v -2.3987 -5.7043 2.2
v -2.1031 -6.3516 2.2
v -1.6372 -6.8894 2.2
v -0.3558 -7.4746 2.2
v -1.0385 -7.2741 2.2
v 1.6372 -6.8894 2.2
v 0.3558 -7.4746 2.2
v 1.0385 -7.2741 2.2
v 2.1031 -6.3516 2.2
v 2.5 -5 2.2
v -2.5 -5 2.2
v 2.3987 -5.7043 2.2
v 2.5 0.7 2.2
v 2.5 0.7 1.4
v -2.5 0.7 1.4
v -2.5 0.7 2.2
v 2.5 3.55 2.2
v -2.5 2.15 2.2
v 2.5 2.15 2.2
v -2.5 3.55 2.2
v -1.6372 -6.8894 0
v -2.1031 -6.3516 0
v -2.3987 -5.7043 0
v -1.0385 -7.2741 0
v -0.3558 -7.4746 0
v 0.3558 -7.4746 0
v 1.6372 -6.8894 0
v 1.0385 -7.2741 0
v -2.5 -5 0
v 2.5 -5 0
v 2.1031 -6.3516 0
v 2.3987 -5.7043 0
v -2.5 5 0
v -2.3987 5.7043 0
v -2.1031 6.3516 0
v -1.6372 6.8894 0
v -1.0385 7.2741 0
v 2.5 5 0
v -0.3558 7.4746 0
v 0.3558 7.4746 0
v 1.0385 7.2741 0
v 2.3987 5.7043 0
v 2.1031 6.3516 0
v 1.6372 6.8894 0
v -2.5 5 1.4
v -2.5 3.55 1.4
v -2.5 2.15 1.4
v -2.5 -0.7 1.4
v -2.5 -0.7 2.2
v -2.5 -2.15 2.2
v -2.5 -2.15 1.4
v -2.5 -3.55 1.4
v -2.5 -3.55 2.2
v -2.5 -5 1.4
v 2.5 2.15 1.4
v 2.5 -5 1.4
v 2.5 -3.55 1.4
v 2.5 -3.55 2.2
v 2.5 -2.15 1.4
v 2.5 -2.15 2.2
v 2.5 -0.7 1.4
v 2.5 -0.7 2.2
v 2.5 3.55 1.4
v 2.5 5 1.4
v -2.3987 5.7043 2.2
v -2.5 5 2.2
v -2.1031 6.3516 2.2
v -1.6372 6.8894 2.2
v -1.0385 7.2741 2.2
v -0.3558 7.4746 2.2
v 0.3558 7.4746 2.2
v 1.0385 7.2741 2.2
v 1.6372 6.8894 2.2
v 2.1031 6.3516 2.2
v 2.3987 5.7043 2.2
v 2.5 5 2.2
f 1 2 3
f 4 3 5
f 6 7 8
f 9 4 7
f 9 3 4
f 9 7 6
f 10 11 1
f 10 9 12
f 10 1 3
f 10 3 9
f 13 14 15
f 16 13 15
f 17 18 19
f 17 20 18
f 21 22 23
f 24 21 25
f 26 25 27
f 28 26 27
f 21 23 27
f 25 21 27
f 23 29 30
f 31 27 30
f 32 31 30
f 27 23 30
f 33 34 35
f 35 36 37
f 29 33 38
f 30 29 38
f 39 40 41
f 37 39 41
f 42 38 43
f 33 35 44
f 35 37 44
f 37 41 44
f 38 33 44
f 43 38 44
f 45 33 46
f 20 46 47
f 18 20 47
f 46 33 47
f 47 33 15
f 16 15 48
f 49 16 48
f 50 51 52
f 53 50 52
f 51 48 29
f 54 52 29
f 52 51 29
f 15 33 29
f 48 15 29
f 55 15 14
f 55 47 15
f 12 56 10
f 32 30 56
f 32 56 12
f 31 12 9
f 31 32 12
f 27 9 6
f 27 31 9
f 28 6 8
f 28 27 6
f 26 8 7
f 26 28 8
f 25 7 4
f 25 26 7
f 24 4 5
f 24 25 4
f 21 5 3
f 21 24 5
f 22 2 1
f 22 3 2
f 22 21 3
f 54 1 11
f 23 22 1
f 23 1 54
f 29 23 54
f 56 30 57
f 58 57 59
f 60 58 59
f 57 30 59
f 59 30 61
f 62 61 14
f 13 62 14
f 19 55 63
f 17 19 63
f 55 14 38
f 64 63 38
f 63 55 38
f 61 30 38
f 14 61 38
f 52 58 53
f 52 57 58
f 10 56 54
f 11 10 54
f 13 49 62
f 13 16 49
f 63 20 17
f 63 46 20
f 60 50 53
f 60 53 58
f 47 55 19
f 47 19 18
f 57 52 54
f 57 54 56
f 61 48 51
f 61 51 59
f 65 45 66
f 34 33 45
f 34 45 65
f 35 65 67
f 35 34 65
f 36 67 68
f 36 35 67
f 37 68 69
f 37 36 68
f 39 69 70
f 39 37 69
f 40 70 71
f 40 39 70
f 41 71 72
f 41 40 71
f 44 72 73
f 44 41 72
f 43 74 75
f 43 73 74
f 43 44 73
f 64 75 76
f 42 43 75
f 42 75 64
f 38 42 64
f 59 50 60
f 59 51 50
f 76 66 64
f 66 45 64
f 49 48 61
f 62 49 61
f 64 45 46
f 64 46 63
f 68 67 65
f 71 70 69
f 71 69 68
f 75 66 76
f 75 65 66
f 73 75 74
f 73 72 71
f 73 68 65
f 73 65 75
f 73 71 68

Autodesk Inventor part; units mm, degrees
ref_plane "YZ Plane" through (0, 0, 0) normal (1, 0, 0) x (0, 1, 0)
ref_plane "XZ Plane" through (0, 0, 0) normal (0, 1, 0) x (-1, 0, 0)
ref_plane "XY Plane" through (0, 0, 0) normal (0, 0, 1) x (1, 0, 0)
sketch "Skizze1" plane through (0, 0, 0) normal (0, 0, 1) x (1, 0, 0)
  line L0 (0, -5) -> (0, 5) construction
  line L1 (2.5, -5) -> (2.5, 5)
  line L2 (-2.5, 5) -> (-2.5, -5)
  arc A0 (-2.5, -5) -> (2.5, -5) centre (0, -5) ccw
  arc A1 (2.5, 5) -> (-2.5, 5) centre (0, 5) ccw
  point P0 (0, 0)
  dimension "d0" = 5
  dimension "d1" = 10
extrude "Extrusion1" add sketch "Skizze1" along normal blind 1.4
sketch "Skizze2" plane through (0, 0, 1.4) normal (0, 0, 1) x (1, 0, 0)
  line L0 (2.5, -5) -> (2.5, 5) projected
  arc A0 (2.5, 5) -> (-2.5, 5) centre (0, 5) ccw projected
  line L1 (-2.5, 5) -> (-2.5, -5) projected
  arc A1 (-2.5, -5) -> (2.5, -5) centre (0, -5) ccw projected
  line L2 (-2.5, 5) -> (-2.5, -5) projected
  line L3 (-2.5, 5) -> (2.5, 5)
  line L4 (2.5, -5) -> (2.5, 5) projected
  line L5 (2.5, -5) -> (-2.5, -5)
  arc A2 (2.5, 5) -> (-2.5, 5) centre (0, 5) ccw
  arc A3 (-2.5, -5) -> (2.5, -5) centre (0, -5) ccw
  line L6 (-2.5, 3.55) -> (2.5, 3.55)
  line L7 (2.5, 3.55) -> (2.5, 2.15)
  line L8 (2.5, 2.15) -> (-2.5, 2.15)
  line L9 (-2.5, 2.15) -> (-2.5, 3.55)
  line L10 (2.5, 0.7) -> (-2.5, 0.7)
  line L11 (-2.5, 0.7) -> (-2.5, -0.7)
  line L12 (-2.5, -0.7) -> (2.5, -0.7)
  line L13 (2.5, -0.7) -> (2.5, 0.7)
  line L14 (-2.5, -2.15) -> (2.5, -2.15)
  line L15 (2.5, -2.15) -> (2.5, -3.55)
  line L16 (2.5, -3.55) -> (-2.5, -3.55)
  line L17 (-2.5, -3.55) -> (-2.5, -2.15)
  line L18 (-3.5, 0) -> (3.5, 0) projected
  line L19 (-2.5, 2.85) -> (2.5, 2.85) construction
  point P0 (0, 0)
  dimension "d4" = 1.4
  dimension "d5" = 1.4
extrude "Extrusion2" add sketch "Skizze2" along normal blind 0.8 contours A1 L5 | L16 L1 L14 L0 | L12 L1 L18 L0 | L18 L1 L10 L0 | L8 L1 L6 L0 | L3 A0
equation "\"d5\" = d4"
properties part number "Dribblerdaempfer Unten" material "Gummi, Silikon"
